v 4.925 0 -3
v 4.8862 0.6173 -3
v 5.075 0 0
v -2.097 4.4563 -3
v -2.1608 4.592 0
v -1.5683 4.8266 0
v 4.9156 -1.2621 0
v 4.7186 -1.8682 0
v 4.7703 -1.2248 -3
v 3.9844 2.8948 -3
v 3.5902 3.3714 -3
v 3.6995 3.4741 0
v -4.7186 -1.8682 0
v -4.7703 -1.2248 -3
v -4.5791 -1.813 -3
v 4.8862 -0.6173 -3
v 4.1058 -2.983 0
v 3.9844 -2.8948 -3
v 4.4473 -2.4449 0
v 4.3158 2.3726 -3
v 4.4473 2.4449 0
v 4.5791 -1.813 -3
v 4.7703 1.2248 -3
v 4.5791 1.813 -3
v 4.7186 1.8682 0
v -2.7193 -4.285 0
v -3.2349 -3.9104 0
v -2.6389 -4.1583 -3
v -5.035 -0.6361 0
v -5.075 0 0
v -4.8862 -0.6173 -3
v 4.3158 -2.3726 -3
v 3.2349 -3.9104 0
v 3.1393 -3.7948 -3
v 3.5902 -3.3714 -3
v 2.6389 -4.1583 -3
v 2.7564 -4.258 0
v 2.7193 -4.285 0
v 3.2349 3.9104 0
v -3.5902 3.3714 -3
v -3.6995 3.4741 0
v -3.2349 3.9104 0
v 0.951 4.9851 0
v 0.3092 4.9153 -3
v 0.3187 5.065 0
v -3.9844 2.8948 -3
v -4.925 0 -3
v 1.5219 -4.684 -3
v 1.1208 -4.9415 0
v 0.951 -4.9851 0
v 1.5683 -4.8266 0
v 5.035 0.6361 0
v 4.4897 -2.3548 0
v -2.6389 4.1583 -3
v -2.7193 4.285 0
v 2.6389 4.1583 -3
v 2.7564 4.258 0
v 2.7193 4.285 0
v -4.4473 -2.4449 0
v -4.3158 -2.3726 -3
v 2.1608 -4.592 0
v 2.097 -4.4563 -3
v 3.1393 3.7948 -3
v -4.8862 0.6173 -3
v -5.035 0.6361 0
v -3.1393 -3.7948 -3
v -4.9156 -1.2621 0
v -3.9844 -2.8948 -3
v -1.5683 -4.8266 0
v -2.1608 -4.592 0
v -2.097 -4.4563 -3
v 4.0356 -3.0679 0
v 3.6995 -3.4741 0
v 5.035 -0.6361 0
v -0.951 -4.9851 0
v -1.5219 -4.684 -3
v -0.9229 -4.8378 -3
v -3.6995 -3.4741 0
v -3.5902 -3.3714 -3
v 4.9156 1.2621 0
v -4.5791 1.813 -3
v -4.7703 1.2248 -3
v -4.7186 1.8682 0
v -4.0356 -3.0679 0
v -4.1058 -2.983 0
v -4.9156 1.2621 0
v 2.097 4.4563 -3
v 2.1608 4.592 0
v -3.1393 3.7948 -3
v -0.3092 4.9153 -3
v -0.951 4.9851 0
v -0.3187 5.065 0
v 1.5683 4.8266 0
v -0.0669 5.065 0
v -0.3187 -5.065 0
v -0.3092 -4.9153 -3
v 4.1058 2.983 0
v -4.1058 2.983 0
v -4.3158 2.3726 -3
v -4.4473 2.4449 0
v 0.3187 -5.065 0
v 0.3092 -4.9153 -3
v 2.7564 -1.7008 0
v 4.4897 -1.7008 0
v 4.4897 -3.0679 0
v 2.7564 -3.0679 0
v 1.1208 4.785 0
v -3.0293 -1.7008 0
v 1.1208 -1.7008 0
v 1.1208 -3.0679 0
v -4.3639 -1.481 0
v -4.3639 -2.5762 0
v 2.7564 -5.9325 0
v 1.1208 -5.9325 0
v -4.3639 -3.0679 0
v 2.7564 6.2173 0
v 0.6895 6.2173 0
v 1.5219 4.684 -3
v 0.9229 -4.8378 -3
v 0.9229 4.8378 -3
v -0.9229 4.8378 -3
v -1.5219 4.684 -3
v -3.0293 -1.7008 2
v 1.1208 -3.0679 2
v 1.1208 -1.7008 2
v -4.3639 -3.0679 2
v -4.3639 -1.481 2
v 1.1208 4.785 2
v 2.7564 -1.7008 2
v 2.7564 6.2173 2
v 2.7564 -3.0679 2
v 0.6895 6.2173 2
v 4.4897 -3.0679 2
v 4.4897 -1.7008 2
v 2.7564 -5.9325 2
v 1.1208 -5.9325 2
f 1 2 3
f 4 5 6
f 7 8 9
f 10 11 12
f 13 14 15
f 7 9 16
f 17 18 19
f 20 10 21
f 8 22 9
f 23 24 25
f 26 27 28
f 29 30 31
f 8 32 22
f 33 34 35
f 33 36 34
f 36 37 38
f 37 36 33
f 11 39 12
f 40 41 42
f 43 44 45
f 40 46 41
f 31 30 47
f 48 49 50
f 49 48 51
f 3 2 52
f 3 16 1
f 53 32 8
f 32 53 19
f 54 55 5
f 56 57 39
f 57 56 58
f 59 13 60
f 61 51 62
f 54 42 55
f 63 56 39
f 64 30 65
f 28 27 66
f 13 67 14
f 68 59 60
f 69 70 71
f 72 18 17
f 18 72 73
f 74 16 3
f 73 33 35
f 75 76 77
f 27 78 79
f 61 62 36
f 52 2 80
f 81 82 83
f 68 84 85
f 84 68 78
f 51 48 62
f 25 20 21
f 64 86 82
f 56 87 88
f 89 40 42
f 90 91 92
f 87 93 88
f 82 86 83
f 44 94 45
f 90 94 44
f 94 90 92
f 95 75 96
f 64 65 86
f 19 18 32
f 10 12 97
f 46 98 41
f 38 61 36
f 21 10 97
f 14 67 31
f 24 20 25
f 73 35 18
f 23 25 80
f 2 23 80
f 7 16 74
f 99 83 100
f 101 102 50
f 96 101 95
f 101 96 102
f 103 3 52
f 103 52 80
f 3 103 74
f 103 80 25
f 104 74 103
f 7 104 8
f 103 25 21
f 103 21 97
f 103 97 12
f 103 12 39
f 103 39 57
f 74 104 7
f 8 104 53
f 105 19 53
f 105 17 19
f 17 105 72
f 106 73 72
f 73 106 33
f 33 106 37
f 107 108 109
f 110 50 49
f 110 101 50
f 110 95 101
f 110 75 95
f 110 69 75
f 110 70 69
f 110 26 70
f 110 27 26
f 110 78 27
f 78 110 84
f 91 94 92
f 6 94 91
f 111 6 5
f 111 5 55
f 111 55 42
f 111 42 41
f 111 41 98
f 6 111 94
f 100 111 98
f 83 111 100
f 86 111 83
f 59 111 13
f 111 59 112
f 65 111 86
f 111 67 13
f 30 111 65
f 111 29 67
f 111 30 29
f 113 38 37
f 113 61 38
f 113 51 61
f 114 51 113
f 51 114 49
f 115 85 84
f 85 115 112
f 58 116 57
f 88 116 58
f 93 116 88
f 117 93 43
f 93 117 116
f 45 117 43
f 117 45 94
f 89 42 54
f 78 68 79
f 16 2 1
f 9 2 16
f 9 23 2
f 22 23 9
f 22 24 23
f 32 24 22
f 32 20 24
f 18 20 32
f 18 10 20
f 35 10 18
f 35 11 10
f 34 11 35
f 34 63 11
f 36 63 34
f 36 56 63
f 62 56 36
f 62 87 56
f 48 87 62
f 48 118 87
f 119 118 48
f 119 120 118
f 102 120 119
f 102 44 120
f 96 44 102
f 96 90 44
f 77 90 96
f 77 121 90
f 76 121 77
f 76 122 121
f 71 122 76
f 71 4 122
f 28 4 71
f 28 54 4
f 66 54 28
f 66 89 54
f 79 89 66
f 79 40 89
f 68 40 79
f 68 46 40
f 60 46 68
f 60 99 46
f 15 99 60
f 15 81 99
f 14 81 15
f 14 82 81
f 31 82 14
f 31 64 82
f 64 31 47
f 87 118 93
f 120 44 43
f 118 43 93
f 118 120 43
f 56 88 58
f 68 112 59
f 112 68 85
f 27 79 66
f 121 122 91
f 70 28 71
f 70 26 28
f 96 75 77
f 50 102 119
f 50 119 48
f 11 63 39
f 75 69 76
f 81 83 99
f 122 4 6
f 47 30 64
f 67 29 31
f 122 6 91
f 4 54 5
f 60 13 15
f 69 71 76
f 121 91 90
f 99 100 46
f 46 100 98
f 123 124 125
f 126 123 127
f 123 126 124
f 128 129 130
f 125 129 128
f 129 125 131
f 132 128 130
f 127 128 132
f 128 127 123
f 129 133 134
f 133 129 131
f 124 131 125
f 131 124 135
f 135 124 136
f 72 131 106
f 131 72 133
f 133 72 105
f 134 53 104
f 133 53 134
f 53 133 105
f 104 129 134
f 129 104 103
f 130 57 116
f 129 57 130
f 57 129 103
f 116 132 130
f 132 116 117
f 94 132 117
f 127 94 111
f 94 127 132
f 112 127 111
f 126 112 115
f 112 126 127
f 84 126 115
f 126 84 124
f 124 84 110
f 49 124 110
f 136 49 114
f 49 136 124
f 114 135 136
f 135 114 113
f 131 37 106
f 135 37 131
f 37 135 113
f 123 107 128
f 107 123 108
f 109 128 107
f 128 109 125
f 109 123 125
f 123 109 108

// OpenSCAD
$fn = 50;

difference() {
	union() {
		translate(v = [0, 0, -3.0]) {
			cylinder(h = 3, r1 = 4.925, r2 = 5.075);
		}
		linear_extrude(height = 2) {
			text(font = "Impact", halign = "center", size = 12, text = "4", valign = "center");
		}
	}
	union();
}
